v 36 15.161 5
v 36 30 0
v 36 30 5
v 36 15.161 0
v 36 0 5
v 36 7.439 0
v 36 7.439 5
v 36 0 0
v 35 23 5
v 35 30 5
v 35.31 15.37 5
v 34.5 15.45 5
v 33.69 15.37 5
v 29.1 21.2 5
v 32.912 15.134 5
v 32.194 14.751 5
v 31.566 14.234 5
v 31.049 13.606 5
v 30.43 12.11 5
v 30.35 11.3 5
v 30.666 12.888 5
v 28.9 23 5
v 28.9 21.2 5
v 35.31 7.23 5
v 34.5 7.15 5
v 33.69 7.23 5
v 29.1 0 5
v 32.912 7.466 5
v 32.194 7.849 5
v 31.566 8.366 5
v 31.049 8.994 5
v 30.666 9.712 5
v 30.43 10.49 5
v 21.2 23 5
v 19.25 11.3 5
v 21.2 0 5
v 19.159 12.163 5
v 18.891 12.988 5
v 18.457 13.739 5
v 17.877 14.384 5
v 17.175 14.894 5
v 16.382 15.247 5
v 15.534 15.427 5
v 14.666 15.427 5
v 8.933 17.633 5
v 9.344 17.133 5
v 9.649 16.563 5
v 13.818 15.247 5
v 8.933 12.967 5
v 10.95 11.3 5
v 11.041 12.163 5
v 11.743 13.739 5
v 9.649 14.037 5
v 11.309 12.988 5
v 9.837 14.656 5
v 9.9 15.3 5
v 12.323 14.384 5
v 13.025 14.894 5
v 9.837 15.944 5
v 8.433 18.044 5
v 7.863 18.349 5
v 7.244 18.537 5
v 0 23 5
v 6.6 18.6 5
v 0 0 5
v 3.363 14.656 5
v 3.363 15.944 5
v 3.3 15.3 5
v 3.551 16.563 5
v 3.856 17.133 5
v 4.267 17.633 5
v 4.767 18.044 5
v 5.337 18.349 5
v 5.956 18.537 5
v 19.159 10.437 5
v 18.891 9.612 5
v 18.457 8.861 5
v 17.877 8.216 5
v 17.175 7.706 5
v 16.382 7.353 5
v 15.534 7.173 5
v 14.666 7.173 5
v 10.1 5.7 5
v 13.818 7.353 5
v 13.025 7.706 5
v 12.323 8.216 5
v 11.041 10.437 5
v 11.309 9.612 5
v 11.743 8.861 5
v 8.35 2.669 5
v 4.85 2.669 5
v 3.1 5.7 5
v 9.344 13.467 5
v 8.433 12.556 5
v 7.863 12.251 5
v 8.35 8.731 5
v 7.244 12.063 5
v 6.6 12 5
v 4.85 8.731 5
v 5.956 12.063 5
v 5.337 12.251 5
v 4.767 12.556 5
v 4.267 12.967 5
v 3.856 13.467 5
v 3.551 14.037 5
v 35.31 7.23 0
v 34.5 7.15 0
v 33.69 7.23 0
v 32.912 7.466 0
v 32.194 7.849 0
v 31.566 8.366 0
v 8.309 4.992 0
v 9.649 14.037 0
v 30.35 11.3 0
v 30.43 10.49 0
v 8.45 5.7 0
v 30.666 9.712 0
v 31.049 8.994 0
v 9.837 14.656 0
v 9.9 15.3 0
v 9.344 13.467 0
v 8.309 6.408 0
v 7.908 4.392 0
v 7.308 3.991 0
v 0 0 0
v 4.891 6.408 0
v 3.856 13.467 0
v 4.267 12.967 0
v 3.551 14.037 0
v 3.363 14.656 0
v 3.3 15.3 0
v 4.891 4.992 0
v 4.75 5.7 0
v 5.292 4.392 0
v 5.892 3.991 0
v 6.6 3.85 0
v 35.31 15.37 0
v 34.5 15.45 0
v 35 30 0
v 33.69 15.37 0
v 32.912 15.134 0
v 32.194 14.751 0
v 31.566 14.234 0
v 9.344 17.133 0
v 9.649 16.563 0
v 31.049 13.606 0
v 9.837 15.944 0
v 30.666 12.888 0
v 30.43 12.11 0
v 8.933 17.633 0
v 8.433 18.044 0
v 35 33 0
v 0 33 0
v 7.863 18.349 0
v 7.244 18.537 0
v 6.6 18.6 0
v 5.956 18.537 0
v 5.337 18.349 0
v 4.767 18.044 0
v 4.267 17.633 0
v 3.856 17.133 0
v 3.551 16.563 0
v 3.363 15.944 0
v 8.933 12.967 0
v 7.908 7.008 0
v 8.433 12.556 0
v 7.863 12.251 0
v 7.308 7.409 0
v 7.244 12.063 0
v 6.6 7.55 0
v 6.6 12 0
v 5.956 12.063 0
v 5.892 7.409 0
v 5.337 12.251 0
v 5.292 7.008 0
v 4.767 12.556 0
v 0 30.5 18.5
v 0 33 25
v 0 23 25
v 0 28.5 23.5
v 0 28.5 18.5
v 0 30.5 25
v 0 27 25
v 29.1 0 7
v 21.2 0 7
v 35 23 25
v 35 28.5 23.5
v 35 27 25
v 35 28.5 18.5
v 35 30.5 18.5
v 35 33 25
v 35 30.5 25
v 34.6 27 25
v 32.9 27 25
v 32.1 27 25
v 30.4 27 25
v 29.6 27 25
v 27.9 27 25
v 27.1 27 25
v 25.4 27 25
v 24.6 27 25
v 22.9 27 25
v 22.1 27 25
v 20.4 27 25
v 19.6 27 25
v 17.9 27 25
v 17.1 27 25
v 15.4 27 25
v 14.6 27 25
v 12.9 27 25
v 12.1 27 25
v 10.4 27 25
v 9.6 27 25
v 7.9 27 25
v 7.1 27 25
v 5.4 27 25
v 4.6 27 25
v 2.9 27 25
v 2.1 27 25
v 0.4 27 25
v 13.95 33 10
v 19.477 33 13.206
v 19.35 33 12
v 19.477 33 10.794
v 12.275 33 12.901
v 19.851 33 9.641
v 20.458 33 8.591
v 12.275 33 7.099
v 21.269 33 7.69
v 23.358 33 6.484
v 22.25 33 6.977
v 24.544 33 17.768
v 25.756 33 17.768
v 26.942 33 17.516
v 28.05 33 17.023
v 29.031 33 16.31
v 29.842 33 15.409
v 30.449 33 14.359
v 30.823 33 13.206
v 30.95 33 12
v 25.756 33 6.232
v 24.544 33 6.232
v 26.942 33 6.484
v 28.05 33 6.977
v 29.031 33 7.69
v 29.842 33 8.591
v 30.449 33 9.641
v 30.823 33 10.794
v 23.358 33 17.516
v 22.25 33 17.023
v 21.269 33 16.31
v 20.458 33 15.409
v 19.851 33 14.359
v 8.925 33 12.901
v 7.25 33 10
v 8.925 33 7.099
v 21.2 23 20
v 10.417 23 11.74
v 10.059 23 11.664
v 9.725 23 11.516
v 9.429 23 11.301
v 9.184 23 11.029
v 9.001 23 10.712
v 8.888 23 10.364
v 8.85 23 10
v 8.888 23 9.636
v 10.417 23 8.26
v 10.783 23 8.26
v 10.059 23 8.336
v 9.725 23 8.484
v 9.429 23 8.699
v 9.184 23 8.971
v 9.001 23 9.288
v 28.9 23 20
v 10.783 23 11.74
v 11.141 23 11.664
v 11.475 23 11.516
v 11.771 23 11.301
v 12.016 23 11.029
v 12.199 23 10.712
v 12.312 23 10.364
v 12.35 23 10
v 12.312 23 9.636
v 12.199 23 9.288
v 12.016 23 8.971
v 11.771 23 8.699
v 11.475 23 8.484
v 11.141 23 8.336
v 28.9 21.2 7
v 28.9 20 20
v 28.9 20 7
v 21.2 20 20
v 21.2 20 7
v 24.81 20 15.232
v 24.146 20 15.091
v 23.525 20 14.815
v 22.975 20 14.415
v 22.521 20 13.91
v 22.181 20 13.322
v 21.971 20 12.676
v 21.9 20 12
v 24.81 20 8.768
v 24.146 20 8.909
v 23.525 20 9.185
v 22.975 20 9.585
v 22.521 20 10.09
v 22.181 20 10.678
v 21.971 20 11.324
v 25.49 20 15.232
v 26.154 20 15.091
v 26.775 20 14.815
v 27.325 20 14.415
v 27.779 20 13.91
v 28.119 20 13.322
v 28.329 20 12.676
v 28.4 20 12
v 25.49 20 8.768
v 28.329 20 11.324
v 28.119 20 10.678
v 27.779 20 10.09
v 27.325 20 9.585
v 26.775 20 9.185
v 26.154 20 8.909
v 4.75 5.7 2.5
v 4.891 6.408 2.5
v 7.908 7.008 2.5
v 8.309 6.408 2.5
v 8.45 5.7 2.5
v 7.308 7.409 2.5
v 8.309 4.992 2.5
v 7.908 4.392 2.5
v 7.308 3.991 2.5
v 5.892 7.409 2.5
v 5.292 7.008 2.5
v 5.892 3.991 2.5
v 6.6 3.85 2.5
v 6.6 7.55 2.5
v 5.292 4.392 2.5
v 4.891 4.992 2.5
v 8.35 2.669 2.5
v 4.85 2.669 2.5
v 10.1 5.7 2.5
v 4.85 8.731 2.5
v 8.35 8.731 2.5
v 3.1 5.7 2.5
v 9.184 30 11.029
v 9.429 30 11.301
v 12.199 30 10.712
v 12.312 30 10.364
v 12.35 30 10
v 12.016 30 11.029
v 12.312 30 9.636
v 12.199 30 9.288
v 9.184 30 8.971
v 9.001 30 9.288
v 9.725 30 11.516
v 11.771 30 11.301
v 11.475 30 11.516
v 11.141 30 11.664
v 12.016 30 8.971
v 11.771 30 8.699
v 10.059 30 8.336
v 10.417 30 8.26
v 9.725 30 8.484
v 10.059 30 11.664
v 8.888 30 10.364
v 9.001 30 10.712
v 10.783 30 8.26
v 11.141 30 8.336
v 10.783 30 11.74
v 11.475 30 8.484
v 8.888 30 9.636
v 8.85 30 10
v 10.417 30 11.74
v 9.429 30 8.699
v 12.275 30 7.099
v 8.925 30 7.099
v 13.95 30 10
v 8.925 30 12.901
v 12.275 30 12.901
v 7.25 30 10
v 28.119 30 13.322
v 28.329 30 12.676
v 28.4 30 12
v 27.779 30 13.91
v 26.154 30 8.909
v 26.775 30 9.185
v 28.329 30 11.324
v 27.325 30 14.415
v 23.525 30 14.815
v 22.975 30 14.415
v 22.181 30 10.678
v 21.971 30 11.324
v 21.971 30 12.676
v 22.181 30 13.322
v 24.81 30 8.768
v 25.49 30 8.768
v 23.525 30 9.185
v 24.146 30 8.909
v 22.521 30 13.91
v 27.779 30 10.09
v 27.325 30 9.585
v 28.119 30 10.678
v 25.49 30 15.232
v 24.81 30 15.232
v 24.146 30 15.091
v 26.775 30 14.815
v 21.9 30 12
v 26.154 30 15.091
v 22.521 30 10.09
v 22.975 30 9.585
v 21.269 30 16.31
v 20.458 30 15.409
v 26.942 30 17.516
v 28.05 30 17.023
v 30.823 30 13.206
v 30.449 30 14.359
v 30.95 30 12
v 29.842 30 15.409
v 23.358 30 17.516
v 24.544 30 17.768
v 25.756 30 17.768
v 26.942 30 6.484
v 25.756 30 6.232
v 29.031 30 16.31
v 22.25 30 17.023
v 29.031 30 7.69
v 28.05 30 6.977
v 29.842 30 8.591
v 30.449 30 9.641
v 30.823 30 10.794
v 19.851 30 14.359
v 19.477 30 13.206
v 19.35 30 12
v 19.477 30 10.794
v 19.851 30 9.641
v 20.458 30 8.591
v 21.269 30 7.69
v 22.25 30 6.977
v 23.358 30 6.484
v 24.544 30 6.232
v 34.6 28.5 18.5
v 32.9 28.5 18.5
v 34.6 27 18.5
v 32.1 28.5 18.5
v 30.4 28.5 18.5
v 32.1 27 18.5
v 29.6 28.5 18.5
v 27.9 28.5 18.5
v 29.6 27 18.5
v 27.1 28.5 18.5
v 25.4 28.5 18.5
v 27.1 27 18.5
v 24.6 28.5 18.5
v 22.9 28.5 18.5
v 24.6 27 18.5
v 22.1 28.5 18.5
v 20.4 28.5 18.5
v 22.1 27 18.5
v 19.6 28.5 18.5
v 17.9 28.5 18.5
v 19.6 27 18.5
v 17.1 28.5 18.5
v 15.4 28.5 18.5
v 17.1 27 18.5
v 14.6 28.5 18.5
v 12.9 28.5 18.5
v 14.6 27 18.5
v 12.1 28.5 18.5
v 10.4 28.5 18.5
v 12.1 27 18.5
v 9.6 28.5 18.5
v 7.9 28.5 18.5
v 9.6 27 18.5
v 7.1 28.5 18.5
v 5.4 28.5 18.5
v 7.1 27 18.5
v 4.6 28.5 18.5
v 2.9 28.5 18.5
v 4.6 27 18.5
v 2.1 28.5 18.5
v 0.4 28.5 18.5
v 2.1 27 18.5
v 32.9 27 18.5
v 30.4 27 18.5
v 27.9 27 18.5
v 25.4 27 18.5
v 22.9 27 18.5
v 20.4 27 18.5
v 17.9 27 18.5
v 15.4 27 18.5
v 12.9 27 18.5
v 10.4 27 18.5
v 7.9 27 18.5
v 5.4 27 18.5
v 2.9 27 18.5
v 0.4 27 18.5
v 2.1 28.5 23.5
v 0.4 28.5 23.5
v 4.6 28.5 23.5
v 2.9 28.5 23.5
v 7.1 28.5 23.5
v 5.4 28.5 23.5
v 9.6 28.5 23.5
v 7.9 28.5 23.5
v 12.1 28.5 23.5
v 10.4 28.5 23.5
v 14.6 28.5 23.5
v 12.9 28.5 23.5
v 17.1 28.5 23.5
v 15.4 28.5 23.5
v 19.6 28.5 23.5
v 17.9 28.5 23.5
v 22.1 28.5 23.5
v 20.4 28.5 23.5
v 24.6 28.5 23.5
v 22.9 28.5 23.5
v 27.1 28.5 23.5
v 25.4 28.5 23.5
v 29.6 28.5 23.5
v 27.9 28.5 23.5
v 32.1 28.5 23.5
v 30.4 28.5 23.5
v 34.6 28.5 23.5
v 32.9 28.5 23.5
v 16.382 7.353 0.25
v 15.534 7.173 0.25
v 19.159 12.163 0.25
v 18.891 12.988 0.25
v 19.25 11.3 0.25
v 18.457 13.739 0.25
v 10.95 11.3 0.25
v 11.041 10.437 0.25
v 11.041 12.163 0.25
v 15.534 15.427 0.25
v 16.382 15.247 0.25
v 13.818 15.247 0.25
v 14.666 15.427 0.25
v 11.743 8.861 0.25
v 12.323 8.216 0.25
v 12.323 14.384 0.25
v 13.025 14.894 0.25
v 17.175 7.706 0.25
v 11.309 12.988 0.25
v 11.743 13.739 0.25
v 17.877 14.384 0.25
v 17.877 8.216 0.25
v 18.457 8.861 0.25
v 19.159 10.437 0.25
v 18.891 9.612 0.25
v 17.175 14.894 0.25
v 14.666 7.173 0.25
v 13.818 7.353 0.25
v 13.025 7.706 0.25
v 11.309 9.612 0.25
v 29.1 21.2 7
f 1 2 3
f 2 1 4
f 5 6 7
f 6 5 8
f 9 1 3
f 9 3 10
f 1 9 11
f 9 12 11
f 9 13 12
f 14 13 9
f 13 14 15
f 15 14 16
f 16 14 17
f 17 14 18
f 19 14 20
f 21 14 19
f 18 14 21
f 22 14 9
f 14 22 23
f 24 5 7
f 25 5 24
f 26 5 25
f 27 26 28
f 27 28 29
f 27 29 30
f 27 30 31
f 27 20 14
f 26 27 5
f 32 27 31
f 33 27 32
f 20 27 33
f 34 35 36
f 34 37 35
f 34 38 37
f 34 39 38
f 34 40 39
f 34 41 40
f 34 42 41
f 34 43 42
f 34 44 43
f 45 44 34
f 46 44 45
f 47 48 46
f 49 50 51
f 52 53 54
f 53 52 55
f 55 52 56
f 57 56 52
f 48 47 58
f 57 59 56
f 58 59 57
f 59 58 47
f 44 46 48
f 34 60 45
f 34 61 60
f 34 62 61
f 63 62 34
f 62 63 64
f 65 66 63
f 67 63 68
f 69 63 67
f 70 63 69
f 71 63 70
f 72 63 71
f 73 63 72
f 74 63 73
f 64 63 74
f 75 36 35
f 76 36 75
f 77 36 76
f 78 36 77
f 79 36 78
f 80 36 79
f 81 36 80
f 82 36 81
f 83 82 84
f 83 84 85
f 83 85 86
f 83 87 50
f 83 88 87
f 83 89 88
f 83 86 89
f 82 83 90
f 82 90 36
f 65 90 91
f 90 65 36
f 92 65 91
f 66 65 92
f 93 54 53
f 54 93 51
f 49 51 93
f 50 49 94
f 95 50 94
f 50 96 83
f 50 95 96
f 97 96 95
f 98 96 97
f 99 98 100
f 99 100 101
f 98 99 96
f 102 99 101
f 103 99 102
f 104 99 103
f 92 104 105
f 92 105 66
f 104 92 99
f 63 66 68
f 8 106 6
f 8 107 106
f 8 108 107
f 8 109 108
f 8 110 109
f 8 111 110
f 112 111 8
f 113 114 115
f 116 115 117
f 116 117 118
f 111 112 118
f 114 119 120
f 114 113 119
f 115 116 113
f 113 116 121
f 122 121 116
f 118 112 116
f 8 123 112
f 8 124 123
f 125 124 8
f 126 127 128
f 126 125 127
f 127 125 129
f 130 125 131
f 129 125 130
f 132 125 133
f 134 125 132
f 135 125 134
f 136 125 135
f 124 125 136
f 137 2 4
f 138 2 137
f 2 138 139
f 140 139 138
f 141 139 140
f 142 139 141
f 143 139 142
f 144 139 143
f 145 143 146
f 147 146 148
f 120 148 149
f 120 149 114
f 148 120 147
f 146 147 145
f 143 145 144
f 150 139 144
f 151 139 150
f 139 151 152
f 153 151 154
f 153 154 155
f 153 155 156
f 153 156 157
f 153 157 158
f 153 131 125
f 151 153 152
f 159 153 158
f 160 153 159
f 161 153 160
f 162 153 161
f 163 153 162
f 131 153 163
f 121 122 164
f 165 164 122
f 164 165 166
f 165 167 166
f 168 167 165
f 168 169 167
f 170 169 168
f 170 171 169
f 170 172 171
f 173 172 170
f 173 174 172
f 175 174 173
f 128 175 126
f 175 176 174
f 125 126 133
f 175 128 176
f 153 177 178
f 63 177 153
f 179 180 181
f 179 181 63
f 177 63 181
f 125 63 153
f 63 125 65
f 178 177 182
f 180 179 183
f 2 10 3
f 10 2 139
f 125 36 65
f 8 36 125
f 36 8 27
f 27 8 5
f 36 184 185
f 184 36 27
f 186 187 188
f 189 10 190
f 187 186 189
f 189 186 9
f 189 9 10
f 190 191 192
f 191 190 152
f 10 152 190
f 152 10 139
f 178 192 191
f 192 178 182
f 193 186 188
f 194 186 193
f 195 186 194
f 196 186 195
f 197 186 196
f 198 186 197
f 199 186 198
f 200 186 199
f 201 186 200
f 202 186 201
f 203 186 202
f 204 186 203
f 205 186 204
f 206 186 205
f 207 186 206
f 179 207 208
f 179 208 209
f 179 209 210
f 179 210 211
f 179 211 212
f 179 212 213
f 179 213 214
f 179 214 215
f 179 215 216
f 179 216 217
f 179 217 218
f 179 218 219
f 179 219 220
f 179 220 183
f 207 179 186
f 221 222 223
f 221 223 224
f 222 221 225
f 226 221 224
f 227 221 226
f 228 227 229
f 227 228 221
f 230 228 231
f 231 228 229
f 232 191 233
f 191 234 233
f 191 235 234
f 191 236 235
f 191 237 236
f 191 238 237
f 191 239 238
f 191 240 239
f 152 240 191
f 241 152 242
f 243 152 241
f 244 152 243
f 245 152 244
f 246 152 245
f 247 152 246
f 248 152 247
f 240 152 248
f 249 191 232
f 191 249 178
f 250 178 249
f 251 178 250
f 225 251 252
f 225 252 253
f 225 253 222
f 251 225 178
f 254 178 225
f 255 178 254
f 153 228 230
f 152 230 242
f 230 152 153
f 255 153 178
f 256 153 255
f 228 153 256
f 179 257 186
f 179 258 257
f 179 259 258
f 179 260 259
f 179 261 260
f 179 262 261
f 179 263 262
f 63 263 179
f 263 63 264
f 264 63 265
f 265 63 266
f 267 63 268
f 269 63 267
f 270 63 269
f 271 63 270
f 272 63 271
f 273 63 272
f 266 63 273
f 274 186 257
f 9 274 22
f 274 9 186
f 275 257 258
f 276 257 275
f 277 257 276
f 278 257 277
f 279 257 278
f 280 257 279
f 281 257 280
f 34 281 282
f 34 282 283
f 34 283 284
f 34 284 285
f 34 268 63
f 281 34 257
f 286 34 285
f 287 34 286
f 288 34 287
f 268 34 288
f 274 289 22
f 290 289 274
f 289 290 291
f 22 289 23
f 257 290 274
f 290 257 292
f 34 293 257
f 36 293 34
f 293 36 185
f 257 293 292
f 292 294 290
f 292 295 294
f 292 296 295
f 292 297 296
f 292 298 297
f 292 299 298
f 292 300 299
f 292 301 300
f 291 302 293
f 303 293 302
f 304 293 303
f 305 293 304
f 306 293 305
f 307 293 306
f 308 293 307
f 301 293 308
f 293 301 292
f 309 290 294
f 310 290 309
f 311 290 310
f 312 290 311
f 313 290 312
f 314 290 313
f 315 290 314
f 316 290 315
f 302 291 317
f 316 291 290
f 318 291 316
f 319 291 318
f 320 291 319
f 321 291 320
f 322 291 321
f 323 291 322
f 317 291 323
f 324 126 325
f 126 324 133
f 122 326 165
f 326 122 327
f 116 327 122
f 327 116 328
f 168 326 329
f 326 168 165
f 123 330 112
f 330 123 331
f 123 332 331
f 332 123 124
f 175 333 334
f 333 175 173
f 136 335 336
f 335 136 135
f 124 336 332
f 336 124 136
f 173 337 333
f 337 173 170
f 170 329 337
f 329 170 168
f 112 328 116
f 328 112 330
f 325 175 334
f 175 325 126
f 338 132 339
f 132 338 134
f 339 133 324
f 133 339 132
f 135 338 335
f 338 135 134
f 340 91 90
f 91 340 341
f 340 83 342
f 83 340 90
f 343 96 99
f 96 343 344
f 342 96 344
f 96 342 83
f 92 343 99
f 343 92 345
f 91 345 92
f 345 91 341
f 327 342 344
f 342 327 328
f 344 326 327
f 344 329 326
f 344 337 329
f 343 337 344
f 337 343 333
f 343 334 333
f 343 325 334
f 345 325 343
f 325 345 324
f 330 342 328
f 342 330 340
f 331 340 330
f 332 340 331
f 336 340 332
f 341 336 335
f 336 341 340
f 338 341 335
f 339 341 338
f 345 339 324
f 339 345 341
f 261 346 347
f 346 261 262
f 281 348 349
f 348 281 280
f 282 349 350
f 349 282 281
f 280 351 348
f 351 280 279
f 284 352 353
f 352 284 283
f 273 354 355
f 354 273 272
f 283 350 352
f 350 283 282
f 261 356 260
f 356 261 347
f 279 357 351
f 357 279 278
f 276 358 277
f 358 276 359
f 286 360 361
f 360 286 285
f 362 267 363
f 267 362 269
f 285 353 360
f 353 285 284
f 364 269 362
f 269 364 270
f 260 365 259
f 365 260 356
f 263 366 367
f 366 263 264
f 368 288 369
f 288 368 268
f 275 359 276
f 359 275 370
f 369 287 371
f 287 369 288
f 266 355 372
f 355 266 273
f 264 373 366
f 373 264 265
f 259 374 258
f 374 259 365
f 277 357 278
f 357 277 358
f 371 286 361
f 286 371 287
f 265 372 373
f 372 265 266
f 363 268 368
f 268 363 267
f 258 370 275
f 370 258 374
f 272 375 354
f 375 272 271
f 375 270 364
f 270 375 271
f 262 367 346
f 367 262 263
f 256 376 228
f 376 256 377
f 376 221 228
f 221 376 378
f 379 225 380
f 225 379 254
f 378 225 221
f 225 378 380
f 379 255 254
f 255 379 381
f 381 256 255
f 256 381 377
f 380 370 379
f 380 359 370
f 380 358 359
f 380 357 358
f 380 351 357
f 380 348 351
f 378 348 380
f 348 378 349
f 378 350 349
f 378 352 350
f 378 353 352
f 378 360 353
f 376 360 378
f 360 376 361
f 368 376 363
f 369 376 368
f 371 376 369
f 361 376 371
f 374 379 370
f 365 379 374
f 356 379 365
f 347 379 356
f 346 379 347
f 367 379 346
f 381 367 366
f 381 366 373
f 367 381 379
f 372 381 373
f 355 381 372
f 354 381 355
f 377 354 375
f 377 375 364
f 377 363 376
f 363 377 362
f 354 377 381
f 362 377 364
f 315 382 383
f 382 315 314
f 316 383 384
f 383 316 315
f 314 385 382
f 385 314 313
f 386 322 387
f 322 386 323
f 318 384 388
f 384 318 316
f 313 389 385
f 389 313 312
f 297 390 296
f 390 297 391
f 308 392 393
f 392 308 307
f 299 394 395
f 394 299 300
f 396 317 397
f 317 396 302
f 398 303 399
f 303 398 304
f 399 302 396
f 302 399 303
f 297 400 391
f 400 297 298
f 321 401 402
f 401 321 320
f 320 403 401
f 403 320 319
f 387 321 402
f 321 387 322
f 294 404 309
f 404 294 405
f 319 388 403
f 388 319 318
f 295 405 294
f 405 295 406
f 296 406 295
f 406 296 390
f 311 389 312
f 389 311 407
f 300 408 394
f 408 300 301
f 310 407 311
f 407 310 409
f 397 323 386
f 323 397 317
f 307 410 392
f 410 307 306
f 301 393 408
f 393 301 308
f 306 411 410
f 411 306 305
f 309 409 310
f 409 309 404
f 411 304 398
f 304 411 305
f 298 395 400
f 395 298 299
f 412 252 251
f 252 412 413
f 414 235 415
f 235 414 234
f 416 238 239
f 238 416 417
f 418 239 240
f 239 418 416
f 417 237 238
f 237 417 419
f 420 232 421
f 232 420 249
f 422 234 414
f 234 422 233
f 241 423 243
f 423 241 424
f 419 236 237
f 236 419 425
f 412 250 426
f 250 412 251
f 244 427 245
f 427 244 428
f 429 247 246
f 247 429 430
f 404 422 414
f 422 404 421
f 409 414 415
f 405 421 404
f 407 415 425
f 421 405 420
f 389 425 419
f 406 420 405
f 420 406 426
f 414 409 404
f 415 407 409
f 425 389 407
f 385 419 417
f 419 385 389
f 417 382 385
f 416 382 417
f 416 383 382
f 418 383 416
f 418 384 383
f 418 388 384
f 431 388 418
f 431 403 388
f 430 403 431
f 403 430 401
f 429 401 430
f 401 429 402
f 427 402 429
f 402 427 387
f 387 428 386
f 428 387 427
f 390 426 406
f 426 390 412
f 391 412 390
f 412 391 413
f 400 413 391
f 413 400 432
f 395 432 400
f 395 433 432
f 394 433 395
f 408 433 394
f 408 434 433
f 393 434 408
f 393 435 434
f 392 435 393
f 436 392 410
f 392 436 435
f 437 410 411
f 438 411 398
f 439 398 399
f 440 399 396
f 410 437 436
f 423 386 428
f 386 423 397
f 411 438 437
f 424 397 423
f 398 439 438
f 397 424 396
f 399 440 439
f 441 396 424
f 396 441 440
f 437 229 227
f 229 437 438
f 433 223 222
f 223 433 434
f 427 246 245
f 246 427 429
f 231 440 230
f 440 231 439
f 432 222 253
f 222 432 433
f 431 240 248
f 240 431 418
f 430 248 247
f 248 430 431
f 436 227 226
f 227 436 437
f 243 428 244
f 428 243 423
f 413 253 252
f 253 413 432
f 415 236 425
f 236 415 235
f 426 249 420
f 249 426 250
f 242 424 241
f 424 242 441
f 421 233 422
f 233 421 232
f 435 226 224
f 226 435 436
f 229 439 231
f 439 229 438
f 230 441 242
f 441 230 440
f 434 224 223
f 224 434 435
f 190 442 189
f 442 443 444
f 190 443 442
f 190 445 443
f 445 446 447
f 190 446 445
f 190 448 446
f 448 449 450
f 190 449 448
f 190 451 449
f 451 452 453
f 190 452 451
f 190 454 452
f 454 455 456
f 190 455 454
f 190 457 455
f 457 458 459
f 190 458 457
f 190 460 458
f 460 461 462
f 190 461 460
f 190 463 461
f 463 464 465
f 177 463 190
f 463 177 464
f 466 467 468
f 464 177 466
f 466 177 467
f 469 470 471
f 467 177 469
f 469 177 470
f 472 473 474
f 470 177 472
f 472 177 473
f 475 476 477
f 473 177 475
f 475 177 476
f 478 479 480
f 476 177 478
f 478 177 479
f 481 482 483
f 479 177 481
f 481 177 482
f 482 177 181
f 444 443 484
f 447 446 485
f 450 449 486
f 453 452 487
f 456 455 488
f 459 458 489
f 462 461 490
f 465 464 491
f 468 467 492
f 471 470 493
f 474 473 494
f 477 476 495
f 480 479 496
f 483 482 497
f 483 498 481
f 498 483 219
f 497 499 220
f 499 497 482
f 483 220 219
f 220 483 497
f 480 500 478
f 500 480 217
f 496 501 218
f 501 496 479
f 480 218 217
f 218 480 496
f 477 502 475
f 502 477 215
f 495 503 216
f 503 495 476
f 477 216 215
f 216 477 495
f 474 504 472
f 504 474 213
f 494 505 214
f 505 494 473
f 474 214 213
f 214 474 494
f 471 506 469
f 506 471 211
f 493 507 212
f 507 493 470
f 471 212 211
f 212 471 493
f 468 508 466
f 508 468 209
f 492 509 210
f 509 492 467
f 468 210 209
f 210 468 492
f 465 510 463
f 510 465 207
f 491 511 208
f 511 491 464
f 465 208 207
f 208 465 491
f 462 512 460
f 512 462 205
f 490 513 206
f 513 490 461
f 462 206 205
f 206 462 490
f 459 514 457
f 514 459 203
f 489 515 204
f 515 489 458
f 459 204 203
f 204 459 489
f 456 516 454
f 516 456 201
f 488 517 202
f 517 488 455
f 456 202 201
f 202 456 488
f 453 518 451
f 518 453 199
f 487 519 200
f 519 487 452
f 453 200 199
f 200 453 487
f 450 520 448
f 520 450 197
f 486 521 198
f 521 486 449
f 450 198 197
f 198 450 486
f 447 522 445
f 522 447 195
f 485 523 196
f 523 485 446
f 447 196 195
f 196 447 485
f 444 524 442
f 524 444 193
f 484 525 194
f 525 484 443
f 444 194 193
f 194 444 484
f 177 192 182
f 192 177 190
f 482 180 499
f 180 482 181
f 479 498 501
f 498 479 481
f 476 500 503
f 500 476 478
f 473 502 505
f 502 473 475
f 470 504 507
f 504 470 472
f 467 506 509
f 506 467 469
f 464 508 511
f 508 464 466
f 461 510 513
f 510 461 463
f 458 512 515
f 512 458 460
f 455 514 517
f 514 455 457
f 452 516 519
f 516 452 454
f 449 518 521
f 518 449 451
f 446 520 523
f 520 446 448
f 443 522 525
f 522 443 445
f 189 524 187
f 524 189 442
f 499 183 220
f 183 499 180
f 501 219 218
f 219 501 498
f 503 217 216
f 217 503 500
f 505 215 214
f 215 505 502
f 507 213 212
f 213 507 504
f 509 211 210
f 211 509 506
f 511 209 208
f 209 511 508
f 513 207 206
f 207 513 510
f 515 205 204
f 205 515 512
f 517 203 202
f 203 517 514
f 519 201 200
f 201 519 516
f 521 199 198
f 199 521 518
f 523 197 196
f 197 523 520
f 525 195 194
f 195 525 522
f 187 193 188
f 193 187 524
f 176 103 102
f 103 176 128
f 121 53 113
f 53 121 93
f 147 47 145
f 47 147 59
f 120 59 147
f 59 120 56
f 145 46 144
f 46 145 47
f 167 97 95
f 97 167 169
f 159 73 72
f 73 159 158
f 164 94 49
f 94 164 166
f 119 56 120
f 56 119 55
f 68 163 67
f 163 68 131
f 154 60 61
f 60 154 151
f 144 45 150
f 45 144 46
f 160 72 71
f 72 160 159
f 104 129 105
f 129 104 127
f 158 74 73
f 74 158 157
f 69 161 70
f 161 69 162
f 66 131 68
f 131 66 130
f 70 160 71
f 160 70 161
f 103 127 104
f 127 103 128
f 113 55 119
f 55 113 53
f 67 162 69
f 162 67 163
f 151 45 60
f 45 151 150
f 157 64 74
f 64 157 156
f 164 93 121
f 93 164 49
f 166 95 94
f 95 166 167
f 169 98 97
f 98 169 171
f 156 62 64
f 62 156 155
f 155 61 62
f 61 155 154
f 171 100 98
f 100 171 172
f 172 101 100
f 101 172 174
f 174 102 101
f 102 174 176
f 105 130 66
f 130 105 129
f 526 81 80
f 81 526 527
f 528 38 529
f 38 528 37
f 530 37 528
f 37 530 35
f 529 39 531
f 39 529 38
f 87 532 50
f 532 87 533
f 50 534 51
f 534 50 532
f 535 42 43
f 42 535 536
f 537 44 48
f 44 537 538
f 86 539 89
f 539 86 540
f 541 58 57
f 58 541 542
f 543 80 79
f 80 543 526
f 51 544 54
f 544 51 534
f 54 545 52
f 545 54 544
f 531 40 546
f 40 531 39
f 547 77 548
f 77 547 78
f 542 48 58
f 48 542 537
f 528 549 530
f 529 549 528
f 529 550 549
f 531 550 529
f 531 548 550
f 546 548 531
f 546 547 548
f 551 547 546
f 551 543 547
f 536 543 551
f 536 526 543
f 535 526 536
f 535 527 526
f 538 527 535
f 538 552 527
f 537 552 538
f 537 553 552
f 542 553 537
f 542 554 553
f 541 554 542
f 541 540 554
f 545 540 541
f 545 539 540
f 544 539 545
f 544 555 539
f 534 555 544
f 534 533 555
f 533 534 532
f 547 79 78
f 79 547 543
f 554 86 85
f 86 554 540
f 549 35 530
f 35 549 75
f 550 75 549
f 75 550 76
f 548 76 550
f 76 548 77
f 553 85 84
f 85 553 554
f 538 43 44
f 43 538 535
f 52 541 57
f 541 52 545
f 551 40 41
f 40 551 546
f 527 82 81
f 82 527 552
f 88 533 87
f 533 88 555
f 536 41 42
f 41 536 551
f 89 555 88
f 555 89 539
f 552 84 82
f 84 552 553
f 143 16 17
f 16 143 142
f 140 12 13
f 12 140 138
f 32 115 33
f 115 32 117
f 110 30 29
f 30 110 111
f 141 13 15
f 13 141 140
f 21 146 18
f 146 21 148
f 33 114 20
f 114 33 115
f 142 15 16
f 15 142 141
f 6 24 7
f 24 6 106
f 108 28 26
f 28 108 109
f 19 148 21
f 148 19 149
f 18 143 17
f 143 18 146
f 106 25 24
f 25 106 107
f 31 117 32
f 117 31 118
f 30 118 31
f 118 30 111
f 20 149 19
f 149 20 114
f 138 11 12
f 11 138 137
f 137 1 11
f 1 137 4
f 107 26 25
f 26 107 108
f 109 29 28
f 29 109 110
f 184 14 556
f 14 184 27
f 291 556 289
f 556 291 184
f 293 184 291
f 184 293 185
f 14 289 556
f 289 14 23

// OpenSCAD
// file: configuration.scad
// Vyska vrstvy pro tisknuti dilu [mm]
layer_height = 0.25; //Slic3r->Print Settings->Layers and perimeters->Layer height

// Rezerva prumeru hlavy sroubu [mm]
spare = 1;
// Prumer hlavy M6 sroubu (pricte se rezerva) [mm]
M6_head_diameter = 10.6+spare;
//M6_head_diameter = 12+spare;

// Vyska hlavy M6 sroubu (dulezite pro zapusteni hlavy sroubu do plastu) [mm]
M6_head_height = 3.6;
//M6_head_height = 4.5;

//Prumery sroubu a tyci
M8_smooth_rod_diameter = 8.3;
M8_smooth_rod_diameter_catch = 8;
M6_diameter = 6.6;
M6_diamater_horizontal = 6.5;
M3_diameter = 3.7;
M3_diameter_horizontal = 3.5;

//Prumery matic
M3_nut_diameter = 7.0;
M3_nut_diameter_horizontal = 6.7;

//ALU profile parameters
ALU_cut_width = 7.9;
ALU_cut_width_horizontal = 7.7;

// Delka motoru (ovlivni dily pro osy Z a Y)
//SX17-1003LQFE (doporuceno hlavne na osu Z)
//motor_length = 29.5;
//SX17-1003 (doporuceno hlavne na osu Z)
motor_length = 34;
//SX17-1005
//motor_length = 40;
//SX17-0905 - zde je jiz problem s velkou vyskou motoru na ose Z - musi se upravit endstop-holder
//motor_length = 48;

// Sirka vytlacovaneho materialu [mm]
extrusion_width = 0.66; //Slic3r->Print Settings->Advanced->Default extrusion width

/// Vyberte typ remenu ******************************************************

// GT2 
//belt_tooth_distance = 2;
//belt_tooth_ratio = 0.6;

// T2.5
belt_tooth_distance = 2.5;
belt_tooth_ratio = 0.68;
// main file
include <./configuration.scad>

difference(){
	union(){
		cube([36,30,5]);
		translate([0,23,0])cube([35,10,25]);
		translate([M6_diameter*2+8,20,0])cube([ALU_cut_width_horizontal,11,20]);
	}
	translate([M6_diameter,M6_diameter+M3_diameter+5,-1])cylinder(r=M6_diameter/2,h=7,$fn=32);
	translate([M6_diameter,M3_diameter+2,-1]){
		cylinder(r=M3_diameter/2,h=7,$fn=16);	
		translate([0,0,3.5])cylinder(r=M3_nut_diameter/2,h=2.6,$fn=6);
	}
	translate([M6_diameter+M8_smooth_rod_diameter_catch+0.5,M8_smooth_rod_diameter+3,layer_height])cylinder(h=7,r=M8_smooth_rod_diameter/2,$fn = 30);
	translate([34.5,M8_smooth_rod_diameter+3,-1])cylinder(h=7,r=M8_smooth_rod_diameter/2,$fn = 32);
	
	translate([M6_diameter+4,34,10]) 
	rotate([90,0,0]){
		cylinder(h = 15, r=M3_diameter_horizontal/2, $fn=30);
		cylinder(h = 4, r=M3_nut_diameter_horizontal/2, $fn=6);
	}

	translate([M6_diameter*2+8+ALU_cut_width/2,34,12]) 
	rotate([90,0,0]){
		cylinder(r = M6_diamater_horizontal/2, h = 15, $fn = 30);
		cylinder(r = M6_head_diameter/2, h = 4, $fn = 30);
	}
	
	translate([-1,27,18.5])belt_holder_beltcut();
}

translate([M6_diameter*2+8,0,0])cube([ALU_cut_width,M6_diameter*2+8,7]);

module belt_holder_beltcut(){
 echo(belt_tooth_ratio*belt_tooth_distance);
 position_tweak=-1.1;
 // Belt slit
 //translate([-66,-0.5+10,3]) 
 translate([0,1.5,0])
 cube([67,2,15]);
 // Smooth insert cutout
 //translate([-66,-0.5+10,12]) 
 translate([0,1.5,5])
 rotate([45,0,0]) cube([67,15,15]);
 // Individual teeth
 for ( i = [0 : 23] ){
 	translate([0+i*belt_tooth_distance+position_tweak,0,0]) cube([belt_tooth_ratio*belt_tooth_distance,1.7,15]);
 }
}
